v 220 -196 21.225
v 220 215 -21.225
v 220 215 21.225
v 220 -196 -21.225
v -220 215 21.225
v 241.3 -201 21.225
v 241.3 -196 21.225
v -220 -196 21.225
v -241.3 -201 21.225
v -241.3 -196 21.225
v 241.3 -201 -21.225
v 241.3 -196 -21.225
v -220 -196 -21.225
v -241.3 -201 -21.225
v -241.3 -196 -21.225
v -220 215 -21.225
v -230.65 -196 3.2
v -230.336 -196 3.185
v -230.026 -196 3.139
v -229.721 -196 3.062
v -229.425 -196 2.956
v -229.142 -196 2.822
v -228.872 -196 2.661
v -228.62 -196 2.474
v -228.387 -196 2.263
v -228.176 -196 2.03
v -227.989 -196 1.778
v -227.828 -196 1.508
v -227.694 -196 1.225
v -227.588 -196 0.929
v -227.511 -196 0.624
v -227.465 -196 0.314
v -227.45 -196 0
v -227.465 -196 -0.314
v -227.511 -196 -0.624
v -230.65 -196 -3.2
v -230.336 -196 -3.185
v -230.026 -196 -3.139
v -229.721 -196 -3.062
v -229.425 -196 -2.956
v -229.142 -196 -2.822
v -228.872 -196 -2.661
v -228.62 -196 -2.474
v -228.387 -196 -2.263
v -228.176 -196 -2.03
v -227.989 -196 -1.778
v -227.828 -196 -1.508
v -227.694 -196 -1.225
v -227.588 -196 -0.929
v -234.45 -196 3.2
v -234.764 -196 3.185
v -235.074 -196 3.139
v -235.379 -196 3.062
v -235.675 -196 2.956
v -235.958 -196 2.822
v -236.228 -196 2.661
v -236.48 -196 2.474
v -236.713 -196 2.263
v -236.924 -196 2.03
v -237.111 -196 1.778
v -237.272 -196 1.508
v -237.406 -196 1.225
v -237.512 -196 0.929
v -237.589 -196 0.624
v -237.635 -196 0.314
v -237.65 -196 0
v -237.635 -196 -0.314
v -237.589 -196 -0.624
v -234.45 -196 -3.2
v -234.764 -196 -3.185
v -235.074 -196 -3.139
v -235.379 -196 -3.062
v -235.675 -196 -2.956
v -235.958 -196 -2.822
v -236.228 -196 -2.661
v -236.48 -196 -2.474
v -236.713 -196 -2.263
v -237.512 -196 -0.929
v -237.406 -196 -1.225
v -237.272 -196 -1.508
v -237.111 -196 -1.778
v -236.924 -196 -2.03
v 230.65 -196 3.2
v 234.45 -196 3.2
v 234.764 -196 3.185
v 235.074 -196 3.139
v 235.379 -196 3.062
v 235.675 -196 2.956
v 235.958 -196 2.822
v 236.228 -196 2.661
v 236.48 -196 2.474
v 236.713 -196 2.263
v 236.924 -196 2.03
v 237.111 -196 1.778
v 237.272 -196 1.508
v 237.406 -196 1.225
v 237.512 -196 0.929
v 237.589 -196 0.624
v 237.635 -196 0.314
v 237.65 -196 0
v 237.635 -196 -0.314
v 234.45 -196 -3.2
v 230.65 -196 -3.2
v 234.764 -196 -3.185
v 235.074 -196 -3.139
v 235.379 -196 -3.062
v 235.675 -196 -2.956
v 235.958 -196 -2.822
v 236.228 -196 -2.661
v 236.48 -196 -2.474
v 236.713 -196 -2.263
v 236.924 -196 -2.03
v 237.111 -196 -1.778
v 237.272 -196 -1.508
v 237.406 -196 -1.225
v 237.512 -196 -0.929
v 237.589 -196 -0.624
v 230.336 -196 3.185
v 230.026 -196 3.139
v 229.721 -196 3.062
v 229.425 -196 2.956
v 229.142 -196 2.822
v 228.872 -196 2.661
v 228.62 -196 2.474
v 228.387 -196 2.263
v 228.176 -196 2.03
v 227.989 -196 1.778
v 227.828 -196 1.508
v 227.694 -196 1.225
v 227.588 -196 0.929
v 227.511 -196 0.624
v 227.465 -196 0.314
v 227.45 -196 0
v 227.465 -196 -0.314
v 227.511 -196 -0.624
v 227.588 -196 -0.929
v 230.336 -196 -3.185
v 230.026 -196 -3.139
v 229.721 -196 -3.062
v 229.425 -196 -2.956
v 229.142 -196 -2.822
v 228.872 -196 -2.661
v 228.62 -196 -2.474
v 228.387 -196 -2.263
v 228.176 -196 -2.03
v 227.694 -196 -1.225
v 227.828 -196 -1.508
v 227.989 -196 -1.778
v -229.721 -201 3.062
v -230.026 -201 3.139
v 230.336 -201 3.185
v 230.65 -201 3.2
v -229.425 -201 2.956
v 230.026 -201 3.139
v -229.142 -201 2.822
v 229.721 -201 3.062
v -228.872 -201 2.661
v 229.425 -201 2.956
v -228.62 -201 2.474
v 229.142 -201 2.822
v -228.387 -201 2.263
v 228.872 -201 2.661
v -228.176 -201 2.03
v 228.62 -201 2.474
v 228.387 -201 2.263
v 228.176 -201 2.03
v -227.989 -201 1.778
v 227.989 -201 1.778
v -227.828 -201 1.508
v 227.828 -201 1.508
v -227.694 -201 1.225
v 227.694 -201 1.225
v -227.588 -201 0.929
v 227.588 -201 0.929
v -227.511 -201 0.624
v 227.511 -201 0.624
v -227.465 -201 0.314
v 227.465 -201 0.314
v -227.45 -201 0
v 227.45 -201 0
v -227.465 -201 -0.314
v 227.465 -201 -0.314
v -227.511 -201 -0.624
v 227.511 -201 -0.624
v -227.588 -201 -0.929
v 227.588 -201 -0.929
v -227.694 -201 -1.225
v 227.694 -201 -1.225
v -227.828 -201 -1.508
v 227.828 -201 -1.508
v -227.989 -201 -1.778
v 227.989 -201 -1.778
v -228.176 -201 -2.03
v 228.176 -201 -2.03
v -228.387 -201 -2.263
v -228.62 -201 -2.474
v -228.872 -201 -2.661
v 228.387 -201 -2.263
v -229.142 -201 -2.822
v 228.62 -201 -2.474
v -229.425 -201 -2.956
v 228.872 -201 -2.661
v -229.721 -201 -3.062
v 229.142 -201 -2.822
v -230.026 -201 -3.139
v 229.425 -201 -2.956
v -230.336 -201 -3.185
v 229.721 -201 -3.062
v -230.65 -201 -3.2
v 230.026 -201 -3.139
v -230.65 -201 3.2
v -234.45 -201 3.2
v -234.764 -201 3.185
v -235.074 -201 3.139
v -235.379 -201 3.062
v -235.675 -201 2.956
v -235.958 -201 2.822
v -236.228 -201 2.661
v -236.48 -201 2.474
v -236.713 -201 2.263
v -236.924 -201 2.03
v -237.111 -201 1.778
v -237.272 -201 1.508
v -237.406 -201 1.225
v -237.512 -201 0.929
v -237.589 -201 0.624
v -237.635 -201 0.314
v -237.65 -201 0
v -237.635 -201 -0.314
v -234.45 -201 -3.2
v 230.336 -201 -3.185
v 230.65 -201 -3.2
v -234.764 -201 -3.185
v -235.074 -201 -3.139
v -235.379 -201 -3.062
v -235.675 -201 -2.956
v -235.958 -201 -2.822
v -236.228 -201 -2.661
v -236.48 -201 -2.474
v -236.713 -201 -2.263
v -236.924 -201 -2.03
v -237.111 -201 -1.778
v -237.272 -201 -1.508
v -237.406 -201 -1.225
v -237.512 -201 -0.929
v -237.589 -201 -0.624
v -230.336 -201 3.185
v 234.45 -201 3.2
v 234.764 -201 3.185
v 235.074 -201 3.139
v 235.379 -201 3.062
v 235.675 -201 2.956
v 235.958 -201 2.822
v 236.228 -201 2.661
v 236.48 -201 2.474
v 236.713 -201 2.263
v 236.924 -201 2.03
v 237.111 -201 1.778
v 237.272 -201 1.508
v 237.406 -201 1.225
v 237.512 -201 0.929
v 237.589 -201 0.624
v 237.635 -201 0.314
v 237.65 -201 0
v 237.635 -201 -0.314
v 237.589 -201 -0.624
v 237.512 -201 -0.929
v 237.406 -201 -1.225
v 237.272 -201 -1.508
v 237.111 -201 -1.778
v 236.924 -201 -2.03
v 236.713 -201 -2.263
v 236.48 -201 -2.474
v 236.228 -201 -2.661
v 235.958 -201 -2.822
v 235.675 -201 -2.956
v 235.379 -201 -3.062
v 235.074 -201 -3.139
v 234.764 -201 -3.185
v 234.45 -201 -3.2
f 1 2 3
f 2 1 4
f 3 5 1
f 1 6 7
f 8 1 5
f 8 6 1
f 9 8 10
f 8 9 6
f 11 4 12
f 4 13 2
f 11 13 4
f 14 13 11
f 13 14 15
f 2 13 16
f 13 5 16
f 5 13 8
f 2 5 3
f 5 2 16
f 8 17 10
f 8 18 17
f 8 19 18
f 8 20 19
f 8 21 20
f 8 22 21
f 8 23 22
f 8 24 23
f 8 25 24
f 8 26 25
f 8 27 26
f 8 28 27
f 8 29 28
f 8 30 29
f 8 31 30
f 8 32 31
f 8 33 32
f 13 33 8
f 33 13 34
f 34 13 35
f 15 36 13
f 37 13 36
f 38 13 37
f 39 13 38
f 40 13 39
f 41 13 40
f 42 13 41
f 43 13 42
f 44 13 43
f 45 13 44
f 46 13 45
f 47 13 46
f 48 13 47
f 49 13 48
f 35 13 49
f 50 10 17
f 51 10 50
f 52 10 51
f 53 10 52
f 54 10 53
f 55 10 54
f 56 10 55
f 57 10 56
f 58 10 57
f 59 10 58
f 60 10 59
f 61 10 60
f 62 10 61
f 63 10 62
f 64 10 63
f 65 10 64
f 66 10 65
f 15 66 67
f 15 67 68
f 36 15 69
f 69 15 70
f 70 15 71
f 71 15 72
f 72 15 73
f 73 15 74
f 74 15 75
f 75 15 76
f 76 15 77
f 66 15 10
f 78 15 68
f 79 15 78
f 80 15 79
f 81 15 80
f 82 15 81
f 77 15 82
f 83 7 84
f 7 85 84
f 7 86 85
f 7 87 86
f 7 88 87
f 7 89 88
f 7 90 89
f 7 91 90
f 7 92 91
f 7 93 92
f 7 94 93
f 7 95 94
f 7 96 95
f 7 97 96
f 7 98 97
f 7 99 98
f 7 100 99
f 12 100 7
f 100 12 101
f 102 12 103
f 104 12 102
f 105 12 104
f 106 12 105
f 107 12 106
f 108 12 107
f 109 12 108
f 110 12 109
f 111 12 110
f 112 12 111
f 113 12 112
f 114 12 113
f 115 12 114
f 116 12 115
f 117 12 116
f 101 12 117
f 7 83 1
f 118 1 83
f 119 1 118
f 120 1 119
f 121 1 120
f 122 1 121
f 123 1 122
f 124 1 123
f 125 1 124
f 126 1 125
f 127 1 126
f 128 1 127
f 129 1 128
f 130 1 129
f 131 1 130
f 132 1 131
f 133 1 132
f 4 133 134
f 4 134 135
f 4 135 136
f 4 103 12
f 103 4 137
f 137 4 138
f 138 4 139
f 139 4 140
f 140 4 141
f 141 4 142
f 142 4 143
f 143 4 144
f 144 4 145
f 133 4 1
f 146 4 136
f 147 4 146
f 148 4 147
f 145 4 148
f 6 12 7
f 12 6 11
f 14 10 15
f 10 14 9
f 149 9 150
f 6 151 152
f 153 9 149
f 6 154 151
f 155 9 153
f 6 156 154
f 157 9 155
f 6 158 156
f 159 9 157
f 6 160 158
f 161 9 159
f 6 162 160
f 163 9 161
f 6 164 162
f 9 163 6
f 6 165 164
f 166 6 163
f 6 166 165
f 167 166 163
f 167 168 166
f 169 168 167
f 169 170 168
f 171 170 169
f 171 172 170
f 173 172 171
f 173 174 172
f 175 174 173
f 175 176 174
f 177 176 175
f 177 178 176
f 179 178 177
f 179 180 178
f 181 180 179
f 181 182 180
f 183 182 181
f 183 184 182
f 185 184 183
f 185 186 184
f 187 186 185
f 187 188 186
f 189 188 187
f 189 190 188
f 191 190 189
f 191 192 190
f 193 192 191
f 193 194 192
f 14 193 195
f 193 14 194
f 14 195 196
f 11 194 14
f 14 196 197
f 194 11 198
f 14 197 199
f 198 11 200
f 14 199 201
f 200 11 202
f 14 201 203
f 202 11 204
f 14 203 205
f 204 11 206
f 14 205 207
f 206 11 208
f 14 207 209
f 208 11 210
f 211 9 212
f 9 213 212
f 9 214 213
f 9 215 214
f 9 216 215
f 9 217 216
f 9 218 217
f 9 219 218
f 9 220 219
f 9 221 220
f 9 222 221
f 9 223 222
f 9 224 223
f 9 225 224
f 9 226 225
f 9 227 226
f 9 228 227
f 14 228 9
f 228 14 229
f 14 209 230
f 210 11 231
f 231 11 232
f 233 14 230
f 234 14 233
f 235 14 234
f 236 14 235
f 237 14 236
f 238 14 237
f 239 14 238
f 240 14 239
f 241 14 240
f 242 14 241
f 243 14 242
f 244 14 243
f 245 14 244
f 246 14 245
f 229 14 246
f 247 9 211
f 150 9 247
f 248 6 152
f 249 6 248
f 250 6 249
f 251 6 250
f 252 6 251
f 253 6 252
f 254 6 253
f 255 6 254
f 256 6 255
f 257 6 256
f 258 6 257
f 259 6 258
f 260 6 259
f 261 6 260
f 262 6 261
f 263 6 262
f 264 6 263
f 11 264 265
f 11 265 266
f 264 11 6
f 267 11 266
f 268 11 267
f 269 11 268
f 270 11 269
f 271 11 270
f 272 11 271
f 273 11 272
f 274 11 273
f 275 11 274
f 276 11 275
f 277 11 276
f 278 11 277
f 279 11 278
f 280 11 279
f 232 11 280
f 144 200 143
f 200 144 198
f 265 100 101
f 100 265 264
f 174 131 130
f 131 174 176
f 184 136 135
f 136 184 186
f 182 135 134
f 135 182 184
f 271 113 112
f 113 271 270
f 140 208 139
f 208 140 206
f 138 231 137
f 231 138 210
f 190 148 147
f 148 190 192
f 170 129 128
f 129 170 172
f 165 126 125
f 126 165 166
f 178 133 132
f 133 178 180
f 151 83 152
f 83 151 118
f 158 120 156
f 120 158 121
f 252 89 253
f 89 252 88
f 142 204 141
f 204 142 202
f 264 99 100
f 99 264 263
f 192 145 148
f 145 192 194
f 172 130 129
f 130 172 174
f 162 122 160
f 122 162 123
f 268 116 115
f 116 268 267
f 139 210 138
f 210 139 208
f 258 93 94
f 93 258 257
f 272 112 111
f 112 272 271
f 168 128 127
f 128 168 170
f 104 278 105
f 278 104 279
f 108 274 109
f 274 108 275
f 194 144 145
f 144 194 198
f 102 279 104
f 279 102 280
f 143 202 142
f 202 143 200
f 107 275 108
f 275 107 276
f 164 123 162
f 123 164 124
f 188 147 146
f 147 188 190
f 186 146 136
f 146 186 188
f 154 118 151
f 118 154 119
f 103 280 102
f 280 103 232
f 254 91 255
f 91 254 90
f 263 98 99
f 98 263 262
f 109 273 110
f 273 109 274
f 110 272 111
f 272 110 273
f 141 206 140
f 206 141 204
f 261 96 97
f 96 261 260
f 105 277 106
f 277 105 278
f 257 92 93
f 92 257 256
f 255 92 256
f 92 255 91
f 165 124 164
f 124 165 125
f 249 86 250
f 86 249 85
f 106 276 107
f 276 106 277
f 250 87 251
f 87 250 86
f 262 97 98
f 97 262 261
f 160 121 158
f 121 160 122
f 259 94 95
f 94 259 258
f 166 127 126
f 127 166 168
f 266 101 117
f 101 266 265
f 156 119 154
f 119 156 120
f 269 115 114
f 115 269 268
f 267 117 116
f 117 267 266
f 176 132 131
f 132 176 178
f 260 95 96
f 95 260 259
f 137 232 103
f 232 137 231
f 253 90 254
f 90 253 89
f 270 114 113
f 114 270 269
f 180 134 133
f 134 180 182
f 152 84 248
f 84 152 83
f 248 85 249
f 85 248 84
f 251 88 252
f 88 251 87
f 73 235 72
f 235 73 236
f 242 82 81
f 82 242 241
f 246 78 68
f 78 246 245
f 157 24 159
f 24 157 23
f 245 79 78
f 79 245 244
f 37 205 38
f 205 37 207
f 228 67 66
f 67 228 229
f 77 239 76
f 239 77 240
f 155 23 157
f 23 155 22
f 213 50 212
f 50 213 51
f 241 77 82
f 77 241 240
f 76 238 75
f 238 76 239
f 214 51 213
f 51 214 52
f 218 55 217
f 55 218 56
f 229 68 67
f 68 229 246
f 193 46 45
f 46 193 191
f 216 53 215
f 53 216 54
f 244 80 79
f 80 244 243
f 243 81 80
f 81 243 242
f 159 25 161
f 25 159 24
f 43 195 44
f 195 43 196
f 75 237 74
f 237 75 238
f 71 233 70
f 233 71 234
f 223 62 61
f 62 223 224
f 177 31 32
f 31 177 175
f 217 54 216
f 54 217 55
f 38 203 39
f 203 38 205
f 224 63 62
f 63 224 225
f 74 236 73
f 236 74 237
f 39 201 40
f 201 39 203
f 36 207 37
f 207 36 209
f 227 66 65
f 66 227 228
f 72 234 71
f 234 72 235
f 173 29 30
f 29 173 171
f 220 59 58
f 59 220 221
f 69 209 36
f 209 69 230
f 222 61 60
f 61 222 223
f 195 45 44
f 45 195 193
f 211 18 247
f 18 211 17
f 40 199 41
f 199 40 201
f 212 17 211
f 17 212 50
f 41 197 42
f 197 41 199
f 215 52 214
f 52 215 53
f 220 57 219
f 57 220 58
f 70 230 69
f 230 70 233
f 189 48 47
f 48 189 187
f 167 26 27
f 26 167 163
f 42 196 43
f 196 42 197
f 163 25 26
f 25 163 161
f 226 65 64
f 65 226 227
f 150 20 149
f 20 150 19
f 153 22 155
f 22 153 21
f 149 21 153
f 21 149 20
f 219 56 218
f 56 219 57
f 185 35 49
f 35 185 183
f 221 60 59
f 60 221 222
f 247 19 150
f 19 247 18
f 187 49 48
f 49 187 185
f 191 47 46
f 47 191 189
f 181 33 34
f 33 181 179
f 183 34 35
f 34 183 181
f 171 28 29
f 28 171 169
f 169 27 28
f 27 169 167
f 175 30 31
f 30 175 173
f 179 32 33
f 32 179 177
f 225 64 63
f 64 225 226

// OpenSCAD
// ============================================================================
// Atom Lithography Machine — Parametric OpenSCAD Module (S1.2-03)
// ============================================================================
// part_id           : S1.2-03
// parent_bom_id     : S1.2
// subsystem         : S1
// part_name         : Wien filtresi cift-kutuplu hassas E-alani guc kaynagi
// material          : Al 6061
// temp_stage        : 300 K (kabin)
// vacuum_grade      : Atmosfer
// tolerance         : ±10 ppm/8 saat
// computed_mass_kg  : 5.35001
// envelope_mm       : 482.600 x 442.500 x 42.450
// design_maturity   : M0_M1_DETAILED_CAD_DESIGN_ONLY
// no_lab_measurement: true
// iec61508_certified: false
// semi_s2_certified : false
// Units: millimeters (mm)
// ============================================================================

$fn = 64;

// Nominal bounding envelope parameters (mm)
bbox_x = 482.6000;
bbox_y = 442.5000;
bbox_z = 42.4500;

// Part-specific parametric dimensions
rack_u = 1;
u_slot = "U35";
v_bipolar_kV = 5.0;
noise_mVpp = 5.0;

// Interface / port parameters (mm)
port_shv_bipolar_ch1_od = 14.000;
port_shv_bipolar_ch2_od = 14.000;

module part_S1_2_03() {
  difference() {
    union() {
      // 1U hollow 19-in chassis body (width along X)
      translate([0.000, 9.500, 0.000]) cube([440.000, 411.000, 42.450], center=true);
      // EIA-310 19-in front panel w/ mounting ears facing -Y
      translate([0.000, -198.500, 0.000]) cube([482.600, 5.000, 42.450], center=true);
    }
    // EIA-310 +X rack slot
    translate([232.550, -198.500, 0.000]) rotate([90.000, 0.000, 0.000]) {
      hull() {
        translate([-1.900, 0, 0]) cylinder(d=6.400, h=9.000, center=true);
        translate([1.900, 0, 0]) cylinder(d=6.400, h=9.000, center=true);
      }
    }
    // EIA-310 -X rack slot
    translate([-232.550, -198.500, 0.000]) rotate([90.000, 0.000, 0.000]) {
      hull() {
        translate([-1.900, 0, 0]) cylinder(d=6.400, h=9.000, center=true);
        translate([1.900, 0, 0]) cylinder(d=6.400, h=9.000, center=true);
      }
    }
  }
}

// World assembly mounting transform (global machine frame, mm / deg):
// translate([1480.000, -223.000, 1123.525]) rotate([0.000, 0.000, 0.000]) part_S1_2_03();

part_S1_2_03();
